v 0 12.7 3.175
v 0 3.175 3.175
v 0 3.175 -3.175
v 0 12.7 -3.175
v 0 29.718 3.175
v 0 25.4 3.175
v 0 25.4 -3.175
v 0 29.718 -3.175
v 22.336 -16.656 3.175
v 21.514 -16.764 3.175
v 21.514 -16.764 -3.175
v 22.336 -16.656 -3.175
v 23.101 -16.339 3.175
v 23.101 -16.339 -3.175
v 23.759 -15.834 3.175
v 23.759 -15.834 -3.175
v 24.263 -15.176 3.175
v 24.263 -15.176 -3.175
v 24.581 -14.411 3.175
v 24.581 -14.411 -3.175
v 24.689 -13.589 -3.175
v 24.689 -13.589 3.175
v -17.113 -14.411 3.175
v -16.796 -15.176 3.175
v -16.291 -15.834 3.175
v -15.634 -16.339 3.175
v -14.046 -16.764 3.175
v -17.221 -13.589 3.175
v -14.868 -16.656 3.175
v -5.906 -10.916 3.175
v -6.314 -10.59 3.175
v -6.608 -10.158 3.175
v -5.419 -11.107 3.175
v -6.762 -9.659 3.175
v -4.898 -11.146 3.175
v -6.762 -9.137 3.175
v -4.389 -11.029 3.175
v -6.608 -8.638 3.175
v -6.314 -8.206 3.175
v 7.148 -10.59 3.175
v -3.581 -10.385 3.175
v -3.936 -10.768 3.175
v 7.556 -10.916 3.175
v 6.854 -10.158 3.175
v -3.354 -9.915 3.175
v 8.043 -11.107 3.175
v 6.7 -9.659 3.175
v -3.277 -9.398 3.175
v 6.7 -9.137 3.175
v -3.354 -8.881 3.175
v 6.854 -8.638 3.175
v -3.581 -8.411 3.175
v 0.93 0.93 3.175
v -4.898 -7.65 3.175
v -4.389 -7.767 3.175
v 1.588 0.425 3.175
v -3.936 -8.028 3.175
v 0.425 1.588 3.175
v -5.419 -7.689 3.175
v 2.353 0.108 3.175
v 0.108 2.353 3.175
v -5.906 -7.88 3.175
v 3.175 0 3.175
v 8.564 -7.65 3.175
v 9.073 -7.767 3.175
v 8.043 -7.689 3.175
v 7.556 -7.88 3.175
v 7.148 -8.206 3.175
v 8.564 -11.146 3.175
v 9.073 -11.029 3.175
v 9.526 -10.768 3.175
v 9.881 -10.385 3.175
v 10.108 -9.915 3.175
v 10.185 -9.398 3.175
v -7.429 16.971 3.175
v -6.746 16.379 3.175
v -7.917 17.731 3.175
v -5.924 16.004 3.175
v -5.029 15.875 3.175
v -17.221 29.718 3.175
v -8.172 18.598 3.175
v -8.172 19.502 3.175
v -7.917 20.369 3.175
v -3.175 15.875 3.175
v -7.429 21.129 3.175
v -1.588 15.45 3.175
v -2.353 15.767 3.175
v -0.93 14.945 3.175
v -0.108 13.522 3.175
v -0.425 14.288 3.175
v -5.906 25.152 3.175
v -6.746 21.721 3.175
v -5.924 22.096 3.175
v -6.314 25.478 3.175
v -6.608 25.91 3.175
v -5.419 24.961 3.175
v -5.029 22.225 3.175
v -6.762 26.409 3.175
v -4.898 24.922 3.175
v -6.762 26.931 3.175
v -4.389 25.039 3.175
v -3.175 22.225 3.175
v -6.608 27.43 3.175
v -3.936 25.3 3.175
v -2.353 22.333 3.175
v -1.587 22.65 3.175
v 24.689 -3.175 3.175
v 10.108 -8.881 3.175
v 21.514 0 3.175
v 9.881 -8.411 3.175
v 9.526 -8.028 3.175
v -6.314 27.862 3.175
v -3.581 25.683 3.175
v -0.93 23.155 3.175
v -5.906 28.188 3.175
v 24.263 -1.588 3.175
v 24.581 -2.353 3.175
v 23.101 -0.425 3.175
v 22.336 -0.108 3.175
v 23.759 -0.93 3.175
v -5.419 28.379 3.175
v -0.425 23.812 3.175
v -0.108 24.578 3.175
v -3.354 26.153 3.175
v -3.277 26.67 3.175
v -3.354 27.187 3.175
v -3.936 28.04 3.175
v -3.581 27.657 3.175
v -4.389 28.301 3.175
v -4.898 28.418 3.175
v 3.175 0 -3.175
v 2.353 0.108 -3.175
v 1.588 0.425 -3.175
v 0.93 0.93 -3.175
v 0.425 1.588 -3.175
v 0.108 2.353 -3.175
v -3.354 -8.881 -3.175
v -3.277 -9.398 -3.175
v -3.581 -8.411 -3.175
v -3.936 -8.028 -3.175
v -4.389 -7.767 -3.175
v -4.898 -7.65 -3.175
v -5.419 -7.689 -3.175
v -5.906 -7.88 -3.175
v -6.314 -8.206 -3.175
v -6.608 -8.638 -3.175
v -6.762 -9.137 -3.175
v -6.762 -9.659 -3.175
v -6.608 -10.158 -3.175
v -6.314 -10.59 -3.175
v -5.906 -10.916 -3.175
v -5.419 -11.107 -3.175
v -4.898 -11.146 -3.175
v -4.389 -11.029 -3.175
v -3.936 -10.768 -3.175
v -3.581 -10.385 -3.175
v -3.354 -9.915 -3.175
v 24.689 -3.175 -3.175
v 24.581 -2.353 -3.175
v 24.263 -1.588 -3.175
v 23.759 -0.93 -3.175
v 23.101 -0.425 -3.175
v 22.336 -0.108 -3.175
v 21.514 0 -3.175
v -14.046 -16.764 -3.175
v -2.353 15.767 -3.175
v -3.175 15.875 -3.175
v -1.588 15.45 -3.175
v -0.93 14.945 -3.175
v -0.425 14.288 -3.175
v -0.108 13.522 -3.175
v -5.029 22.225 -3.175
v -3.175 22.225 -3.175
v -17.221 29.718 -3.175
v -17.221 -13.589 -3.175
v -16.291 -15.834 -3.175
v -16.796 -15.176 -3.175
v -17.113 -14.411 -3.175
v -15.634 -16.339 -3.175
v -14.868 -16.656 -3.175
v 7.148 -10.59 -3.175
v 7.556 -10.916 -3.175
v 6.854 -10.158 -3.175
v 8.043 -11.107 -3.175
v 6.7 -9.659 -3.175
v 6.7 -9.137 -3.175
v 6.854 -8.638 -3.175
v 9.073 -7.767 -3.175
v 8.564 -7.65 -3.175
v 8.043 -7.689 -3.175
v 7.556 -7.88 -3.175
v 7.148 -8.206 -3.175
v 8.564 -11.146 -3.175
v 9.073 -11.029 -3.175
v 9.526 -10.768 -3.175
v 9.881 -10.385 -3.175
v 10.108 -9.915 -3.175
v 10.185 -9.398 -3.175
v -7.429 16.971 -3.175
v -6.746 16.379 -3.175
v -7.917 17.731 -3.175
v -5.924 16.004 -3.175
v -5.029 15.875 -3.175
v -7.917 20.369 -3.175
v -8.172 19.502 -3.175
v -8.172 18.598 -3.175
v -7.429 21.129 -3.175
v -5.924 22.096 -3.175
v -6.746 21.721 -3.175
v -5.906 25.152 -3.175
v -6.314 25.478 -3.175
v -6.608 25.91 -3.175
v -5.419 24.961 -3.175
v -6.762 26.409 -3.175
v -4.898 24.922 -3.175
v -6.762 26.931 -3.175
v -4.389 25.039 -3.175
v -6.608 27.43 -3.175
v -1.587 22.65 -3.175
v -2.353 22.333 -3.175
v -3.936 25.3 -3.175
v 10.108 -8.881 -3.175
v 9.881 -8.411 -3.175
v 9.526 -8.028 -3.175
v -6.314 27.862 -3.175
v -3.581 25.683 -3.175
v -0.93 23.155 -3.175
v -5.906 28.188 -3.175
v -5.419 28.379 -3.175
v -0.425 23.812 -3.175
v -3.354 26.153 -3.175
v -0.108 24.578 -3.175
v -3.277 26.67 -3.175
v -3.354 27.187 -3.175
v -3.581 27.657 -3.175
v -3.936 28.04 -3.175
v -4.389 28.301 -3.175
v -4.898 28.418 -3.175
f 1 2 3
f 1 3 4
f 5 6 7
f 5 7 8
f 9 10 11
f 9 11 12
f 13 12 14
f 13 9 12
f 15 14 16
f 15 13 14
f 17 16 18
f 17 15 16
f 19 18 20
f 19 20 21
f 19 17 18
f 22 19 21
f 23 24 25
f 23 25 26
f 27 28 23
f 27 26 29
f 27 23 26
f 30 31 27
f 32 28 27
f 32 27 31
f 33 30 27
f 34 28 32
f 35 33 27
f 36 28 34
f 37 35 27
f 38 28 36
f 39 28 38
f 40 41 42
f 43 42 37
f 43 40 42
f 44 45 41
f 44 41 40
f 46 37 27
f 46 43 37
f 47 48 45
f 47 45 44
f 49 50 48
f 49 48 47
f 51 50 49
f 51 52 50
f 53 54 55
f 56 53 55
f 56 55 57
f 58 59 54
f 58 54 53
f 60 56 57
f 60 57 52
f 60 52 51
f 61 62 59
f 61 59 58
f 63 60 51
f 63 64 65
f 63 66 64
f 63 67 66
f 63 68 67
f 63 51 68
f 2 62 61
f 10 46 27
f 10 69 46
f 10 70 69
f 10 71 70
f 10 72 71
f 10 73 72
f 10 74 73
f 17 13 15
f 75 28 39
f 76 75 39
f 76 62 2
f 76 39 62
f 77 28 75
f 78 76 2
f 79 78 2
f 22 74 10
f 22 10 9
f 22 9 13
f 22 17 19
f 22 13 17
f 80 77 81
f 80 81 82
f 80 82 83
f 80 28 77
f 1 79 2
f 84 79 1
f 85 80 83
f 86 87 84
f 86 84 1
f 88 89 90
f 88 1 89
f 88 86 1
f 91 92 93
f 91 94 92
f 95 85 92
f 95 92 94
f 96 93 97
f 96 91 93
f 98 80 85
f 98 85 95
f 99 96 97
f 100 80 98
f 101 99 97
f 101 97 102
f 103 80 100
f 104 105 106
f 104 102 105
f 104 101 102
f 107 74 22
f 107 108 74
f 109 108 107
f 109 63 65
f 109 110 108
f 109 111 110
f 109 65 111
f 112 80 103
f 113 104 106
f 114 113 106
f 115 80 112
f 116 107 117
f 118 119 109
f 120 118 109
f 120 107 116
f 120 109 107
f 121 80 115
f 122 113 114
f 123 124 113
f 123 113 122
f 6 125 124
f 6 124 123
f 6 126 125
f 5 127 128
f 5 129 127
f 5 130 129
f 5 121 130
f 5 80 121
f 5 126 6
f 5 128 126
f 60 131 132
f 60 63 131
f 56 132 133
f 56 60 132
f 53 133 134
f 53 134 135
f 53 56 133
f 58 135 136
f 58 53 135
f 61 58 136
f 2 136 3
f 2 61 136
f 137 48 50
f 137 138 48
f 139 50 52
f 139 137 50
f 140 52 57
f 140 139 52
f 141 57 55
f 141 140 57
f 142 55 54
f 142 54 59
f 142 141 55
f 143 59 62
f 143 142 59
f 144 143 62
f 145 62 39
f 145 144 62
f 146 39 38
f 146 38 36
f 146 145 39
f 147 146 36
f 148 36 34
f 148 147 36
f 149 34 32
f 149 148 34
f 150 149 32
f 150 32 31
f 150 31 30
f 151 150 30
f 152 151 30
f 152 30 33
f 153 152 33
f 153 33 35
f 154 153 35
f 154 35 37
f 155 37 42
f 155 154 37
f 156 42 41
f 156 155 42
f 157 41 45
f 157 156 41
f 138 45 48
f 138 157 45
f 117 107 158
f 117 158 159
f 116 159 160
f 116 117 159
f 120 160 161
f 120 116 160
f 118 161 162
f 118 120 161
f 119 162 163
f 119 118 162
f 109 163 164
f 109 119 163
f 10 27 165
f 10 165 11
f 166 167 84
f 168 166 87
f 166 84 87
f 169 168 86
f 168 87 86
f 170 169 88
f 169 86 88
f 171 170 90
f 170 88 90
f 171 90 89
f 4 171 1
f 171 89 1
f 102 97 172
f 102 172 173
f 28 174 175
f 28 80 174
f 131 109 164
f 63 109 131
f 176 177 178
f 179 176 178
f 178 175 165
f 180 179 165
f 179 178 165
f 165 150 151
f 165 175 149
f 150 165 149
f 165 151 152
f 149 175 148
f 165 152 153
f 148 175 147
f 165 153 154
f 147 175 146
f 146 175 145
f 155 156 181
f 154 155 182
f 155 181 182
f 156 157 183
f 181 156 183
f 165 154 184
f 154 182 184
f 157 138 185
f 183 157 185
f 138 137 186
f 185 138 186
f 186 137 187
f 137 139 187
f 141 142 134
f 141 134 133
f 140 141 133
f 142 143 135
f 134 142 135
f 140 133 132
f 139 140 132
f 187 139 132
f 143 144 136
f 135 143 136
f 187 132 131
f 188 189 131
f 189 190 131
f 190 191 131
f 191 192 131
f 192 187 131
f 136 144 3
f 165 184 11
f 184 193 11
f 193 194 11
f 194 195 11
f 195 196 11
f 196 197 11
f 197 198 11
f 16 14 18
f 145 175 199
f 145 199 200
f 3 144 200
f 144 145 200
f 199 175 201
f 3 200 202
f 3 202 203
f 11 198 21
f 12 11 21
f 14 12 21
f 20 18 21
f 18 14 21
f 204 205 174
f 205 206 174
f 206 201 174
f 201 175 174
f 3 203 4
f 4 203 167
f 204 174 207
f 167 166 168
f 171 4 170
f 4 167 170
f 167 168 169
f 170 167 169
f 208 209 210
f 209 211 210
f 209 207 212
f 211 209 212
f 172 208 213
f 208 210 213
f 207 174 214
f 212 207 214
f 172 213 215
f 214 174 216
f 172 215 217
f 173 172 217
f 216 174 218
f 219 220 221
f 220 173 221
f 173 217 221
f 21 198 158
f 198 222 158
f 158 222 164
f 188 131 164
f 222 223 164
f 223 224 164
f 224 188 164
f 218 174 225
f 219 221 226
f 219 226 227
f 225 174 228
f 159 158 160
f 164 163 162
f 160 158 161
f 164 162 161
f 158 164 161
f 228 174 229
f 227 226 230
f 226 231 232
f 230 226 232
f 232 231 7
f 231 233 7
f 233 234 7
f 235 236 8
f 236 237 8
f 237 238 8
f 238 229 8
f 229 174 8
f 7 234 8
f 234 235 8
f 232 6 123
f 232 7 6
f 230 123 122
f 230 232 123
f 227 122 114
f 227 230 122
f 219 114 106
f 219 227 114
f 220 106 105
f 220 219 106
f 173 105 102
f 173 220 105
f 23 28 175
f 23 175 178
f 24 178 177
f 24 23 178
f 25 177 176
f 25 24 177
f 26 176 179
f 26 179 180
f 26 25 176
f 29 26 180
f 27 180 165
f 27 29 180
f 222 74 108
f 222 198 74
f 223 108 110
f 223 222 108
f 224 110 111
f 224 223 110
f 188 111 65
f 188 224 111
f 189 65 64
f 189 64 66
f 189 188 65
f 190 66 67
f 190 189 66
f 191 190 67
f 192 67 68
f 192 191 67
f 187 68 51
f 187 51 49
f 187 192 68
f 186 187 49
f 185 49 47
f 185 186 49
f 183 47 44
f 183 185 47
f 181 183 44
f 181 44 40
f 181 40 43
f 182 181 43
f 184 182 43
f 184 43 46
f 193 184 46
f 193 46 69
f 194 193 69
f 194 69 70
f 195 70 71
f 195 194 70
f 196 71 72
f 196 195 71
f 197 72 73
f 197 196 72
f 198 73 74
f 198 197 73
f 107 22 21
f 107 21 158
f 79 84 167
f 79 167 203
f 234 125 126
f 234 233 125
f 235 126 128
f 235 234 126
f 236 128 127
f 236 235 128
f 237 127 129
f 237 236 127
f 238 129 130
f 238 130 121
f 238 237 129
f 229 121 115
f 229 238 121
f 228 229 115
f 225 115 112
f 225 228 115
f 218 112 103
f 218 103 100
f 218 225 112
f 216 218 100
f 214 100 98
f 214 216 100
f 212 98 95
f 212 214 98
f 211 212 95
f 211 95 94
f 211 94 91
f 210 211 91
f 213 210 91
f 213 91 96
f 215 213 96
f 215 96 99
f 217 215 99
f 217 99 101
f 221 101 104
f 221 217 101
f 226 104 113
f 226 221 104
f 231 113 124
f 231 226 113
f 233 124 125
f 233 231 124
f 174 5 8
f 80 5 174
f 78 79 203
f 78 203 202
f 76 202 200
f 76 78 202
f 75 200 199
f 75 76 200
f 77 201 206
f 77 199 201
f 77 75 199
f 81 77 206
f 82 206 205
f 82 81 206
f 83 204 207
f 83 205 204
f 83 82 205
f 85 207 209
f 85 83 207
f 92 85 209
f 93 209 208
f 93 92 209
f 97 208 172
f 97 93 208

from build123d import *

# Parameters (mm, degrees)
SKETCH1_R           = 1.7526
BOSS_EXTRUDE1_DEPTH = 3.175
CUT_EXTRUDE1_DEPTH  = 40.153784867
FILLET1_R           = 3.175


with BuildPart() as part:
    # Sketch1 → Boss-Extrude1 (new, symmetric)
    with BuildSketch(Plane.XY):
        with BuildLine():
            Line((-17.2212, 29.718), (-17.2212, -13.589))
            ThreePointArc((-17.2212, -13.589), (-16.29126403, -15.83406403), (-14.0462, -16.764))
            Line((-14.0462, -16.764), (21.5138, -16.764))
            ThreePointArc((21.5138, -16.764), (23.75886403, -15.83406403), (24.6888, -13.589))
            Line((24.6888, -13.589), (24.6888, -3.175))
            ThreePointArc((24.6888, -3.175), (23.75886403, -0.92993597), (21.5138, 0))
            Line((21.5138, 0), (3.175, 0))
            ThreePointArc((3.175, 0), (0.92993597, 0.92993597), (0, 3.175))
            Line((0, 3.175), (0, 29.718))
            Line((0, 29.718), (-17.2212, 29.718))
        make_face()
        with Locations((-5.0292, 26.67)):
            Circle(SKETCH1_R, mode=Mode.SUBTRACT)
        with Locations((-5.0292, -9.398)):
            Circle(SKETCH1_R, mode=Mode.SUBTRACT)
        with Locations((8.4328, -9.398)):
            Circle(SKETCH1_R, mode=Mode.SUBTRACT)
    extrude(amount=BOSS_EXTRUDE1_DEPTH, both=True)

    # Sketch2 → Cut-Extrude1 (cut, through all)
    with BuildSketch(Plane.XY.offset(3.175)):
        with BuildLine():
            Line((-5.0292, 22.225), (24.6888, 22.225))
            Line((24.6888, 22.225), (24.6888, 15.875))
            Line((24.6888, 15.875), (-5.0292, 15.875))
            ThreePointArc((-5.0292, 15.875), (-8.2042, 19.05), (-5.0292, 22.225))
        make_face()
    extrude(amount=-CUT_EXTRUDE1_DEPTH, mode=Mode.SUBTRACT)

    # Fillet1
    fillet1_edges = [part.edges().sort_by_distance(p)[0] for p in [
        (0, 15.875, 0),
        (0, 22.225, 0),
    ]]
    fillet(fillet1_edges, radius=FILLET1_R)


solid = part.part
